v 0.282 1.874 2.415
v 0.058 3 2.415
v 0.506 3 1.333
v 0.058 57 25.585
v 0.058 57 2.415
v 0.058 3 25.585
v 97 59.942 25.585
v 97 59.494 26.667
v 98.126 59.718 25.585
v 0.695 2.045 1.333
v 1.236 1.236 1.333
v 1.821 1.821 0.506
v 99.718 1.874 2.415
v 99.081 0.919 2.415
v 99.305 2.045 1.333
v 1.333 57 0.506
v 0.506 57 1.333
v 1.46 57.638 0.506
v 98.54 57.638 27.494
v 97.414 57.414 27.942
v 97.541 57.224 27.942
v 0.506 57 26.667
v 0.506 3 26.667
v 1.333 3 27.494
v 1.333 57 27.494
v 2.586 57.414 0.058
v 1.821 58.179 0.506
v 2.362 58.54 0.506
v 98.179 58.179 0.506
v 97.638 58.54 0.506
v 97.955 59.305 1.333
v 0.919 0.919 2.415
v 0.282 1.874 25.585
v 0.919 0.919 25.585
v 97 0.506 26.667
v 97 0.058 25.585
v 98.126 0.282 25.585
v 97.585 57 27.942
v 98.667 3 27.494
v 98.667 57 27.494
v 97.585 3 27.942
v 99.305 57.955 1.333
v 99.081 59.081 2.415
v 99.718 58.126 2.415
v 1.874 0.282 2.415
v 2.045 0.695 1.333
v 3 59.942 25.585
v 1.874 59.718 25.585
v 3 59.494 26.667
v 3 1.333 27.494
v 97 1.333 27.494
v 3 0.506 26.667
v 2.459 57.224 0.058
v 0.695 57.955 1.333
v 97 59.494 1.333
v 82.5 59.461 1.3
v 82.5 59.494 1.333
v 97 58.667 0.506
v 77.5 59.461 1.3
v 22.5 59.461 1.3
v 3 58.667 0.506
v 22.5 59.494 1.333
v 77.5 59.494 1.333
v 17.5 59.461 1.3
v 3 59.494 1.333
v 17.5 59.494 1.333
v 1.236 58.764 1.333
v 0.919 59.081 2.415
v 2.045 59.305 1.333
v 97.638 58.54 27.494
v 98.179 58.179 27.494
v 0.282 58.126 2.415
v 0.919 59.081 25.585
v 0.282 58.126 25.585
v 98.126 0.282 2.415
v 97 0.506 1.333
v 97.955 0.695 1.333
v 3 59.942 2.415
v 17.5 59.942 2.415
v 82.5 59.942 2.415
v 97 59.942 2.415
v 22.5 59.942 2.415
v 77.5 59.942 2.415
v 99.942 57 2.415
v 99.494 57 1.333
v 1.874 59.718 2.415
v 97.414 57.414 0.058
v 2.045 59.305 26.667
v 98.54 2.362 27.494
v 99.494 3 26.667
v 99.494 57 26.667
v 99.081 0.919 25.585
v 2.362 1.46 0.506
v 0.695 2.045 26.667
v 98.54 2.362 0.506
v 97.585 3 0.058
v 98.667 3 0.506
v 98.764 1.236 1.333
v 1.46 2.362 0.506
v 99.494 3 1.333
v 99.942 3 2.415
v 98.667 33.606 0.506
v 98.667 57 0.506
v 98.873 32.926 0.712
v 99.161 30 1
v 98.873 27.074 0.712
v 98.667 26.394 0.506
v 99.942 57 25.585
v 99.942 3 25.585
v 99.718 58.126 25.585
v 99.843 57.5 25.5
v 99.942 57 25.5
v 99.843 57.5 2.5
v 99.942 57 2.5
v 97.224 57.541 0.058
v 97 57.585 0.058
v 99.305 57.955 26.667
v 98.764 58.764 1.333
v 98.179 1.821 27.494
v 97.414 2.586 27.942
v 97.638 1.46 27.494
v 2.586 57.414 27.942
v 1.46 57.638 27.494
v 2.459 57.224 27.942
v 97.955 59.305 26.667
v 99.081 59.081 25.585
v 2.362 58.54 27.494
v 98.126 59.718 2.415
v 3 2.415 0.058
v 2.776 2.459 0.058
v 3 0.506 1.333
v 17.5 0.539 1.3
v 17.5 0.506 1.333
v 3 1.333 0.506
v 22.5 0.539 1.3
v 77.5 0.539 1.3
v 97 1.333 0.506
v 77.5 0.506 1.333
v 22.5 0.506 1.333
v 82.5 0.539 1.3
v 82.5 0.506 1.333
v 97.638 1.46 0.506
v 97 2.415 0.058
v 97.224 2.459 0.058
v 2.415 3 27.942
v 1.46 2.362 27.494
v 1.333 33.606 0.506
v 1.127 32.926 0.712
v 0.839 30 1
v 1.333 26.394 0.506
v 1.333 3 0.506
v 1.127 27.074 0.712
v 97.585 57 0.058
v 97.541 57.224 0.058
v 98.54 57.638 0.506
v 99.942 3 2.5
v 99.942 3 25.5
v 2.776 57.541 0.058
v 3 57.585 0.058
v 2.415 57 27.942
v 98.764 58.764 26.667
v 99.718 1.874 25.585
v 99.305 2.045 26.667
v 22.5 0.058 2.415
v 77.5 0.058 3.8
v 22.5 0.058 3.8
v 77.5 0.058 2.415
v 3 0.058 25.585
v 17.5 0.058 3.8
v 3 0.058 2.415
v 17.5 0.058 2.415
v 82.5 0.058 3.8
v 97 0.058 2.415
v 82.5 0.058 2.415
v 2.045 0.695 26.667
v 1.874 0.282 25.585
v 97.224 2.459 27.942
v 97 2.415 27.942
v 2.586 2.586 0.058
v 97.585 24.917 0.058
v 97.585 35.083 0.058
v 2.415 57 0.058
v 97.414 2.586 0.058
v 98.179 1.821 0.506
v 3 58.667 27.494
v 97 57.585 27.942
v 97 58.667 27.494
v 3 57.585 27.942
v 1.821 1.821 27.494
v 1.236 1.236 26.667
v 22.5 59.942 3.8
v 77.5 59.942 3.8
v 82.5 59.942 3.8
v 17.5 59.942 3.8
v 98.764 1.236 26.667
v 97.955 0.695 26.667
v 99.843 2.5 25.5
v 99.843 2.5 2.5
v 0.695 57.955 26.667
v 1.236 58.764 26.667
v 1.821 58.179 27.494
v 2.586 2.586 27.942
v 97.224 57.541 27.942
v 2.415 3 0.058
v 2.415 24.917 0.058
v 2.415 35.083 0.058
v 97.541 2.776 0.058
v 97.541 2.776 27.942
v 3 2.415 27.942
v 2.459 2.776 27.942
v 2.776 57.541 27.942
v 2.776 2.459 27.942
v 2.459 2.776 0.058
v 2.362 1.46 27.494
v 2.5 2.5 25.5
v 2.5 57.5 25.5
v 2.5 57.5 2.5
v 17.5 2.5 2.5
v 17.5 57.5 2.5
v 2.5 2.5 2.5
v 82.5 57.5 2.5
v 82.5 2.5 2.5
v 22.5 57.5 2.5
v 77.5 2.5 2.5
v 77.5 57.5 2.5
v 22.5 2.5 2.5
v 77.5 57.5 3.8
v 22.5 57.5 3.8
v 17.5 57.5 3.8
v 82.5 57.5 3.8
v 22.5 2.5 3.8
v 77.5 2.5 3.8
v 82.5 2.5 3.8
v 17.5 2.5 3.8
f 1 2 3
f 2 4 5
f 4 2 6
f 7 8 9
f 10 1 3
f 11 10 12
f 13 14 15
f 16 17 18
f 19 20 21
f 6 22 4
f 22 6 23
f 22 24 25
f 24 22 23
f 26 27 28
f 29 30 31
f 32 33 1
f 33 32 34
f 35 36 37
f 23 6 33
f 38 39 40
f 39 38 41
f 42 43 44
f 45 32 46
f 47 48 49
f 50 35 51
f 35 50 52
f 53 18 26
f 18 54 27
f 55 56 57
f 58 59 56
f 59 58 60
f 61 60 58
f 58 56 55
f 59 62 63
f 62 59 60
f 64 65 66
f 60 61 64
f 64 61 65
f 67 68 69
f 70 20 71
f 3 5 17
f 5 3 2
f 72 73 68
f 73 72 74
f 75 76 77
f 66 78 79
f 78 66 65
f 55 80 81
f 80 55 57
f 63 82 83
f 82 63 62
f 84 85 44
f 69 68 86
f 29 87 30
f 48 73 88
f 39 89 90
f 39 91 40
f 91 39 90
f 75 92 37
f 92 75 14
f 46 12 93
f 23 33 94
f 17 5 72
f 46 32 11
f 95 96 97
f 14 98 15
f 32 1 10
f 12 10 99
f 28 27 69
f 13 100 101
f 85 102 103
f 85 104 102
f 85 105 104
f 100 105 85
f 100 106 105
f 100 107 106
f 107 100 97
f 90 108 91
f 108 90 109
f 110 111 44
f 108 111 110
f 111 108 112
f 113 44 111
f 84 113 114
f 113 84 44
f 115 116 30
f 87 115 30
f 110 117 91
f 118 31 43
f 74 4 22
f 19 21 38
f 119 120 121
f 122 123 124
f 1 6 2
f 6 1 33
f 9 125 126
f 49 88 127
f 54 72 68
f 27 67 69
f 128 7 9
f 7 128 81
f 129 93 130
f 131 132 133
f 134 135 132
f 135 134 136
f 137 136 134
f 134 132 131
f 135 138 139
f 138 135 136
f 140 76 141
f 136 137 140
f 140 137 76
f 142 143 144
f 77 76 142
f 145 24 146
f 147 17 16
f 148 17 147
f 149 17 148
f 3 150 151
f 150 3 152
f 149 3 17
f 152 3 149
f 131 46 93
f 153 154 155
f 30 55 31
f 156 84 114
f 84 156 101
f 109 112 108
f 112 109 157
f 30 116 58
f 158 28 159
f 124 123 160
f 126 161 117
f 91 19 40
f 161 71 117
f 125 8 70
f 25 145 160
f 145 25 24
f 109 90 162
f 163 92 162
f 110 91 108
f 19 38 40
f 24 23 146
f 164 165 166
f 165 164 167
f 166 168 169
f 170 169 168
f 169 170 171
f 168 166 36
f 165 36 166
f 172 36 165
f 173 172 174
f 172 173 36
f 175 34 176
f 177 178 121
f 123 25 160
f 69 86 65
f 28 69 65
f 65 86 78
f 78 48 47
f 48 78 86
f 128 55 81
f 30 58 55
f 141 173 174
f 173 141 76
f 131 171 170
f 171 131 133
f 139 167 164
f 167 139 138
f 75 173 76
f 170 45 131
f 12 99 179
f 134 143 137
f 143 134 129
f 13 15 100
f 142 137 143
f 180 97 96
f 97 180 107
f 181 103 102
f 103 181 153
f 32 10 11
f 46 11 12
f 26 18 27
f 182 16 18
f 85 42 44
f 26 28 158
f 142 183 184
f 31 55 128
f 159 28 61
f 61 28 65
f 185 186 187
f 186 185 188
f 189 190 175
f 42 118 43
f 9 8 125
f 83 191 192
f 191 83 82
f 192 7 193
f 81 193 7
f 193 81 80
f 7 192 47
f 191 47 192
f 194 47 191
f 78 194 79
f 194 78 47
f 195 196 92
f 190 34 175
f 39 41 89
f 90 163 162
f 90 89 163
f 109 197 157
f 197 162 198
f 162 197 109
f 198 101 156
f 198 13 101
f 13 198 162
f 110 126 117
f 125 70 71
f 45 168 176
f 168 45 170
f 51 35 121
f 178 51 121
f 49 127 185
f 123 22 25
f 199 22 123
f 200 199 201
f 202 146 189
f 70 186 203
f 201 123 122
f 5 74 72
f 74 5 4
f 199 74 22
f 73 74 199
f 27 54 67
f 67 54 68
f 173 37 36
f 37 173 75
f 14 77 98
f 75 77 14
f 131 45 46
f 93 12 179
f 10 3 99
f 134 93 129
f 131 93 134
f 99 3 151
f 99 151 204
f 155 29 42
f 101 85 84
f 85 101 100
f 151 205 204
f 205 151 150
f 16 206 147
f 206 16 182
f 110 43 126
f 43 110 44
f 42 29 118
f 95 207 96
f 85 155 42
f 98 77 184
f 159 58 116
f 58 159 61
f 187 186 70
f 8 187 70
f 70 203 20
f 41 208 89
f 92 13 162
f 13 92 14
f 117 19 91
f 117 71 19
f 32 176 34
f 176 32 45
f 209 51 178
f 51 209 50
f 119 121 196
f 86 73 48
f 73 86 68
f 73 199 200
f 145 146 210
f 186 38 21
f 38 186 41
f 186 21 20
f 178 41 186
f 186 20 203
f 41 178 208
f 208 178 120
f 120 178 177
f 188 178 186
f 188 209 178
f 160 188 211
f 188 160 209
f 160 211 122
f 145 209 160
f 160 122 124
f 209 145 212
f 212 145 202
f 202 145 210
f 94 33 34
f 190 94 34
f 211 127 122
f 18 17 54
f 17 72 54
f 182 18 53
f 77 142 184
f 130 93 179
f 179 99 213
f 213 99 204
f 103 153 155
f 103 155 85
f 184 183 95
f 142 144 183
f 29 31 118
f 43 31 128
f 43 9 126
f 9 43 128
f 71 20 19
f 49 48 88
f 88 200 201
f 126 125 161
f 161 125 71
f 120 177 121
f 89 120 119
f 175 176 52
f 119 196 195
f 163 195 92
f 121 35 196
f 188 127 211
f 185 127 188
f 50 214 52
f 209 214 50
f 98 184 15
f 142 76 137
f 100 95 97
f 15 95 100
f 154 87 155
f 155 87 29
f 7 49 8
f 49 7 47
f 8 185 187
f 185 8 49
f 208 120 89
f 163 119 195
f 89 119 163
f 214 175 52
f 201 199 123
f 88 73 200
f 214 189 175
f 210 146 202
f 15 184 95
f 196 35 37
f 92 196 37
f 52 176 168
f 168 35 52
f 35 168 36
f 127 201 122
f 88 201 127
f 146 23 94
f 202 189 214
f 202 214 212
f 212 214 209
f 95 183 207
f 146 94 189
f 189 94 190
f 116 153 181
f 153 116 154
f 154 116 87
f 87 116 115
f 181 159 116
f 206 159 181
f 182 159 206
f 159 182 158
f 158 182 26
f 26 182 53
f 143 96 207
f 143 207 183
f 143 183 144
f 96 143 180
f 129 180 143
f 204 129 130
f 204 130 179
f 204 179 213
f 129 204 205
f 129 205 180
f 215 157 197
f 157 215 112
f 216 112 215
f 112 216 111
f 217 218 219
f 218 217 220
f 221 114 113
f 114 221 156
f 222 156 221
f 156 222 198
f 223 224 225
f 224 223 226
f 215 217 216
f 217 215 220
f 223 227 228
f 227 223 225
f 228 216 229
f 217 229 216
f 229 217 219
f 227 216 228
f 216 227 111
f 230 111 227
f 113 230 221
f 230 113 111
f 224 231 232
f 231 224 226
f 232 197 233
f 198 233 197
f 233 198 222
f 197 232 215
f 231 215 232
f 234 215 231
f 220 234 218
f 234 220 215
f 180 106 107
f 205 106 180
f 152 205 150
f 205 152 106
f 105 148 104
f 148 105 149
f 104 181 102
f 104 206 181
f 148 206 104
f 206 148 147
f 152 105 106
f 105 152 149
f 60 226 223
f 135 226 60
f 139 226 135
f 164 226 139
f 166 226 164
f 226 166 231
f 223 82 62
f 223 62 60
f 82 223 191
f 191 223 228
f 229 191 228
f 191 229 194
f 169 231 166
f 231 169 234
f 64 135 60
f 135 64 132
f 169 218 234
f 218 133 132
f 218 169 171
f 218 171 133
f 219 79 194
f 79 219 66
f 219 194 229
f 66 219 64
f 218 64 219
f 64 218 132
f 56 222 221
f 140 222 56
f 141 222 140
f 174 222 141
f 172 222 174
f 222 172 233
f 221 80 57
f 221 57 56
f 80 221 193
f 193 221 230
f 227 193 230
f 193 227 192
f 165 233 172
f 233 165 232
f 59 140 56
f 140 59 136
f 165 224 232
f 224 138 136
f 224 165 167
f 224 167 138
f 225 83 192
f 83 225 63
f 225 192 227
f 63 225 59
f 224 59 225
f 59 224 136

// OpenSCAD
// file: ../../00_common/parameters.scad
// =============================================================================
// OpenMotorBridge - Global CAD Parameters & Settings
// =============================================================================
// File: hardware/cad/scad/00_common/parameters.scad
// Description: Global dimensional constants, manufacturing clearances and
//              circle resolution ($fn) for all OpenSCAD modules.
// =============================================================================

// --- 1. Circle & Curve Resolution ---
$fn = 60; // Smooth cylinders and holes for high-quality MJF 3D printing

// --- 2. Central Main Box Dimensions (3-Tier Sandwich) ---
MAIN_BOX_OUTER_L      = 110.0; // Outer length in X (mm)
MAIN_BOX_OUTER_W      = 74.0;  // Outer width in Y (mm)
MAIN_BOX_LOWER_H      = 17.0;  // Lower case height in Z (mm)
MAIN_BOX_MID_H        = 15.0;  // Mid tray height in Z (mm)
MAIN_BOX_LID_H        = 4.0;   // Lid plate thickness in Z (mm)
MAIN_BOX_WALL         = 2.5;   // Nominal wall thickness (mm)
MAIN_BOX_CORNER_POST  = 5.0;   // Corner clamping screw post size (mm)

// --- 3. Satellite Pod Dimensions (Universal 1-Pod Housing) ---
POD_OUTER_L           = 100.0; // Outer length in X (mm)
POD_OUTER_W           = 60.0;  // Outer width in Y (mm)
POD_OUTER_H           = 28.0;  // Outer height in Z (mm)
POD_WALL              = 2.5;   // Nominal wall thickness (mm)
POD_BULKHEAD_X        = 22.0;  // Partition bulkhead position in X (mm)
POD_CHAMBER_L         = 78.0;  // Sliding chamber length in X (mm)
POD_CHAMBER_W         = 55.0;  // Sliding chamber width in Y (mm)
POD_CHAMBER_H         = 23.0;  // Sliding chamber height in Z (mm)

// --- 4. Pod Linear Guide Rails (Poka-Yoke Tongue & Groove) ---
POD_GROOVE_W          = 3.0;   // Internal guide groove width in Z (mm)
POD_GROOVE_DEPTH      = 1.5;   // Internal guide groove depth in Y (mm)
POD_GROOVE_LEFT_Z     = 8.2;   // Center height of left groove (mm)
POD_GROOVE_RIGHT_Z    = 14.2;  // Center height of right groove (mm, asym offset)

CARTRIDGE_TONGUE_W    = 2.6;   // Cartridge tongue rail height in Z (mm, 0.2mm clearance)
CARTRIDGE_TONGUE_PROT = 1.4;   // Cartridge tongue protrusion in Y (mm, 0.1mm clearance)
CARTRIDGE_CHAMFER_L   = 4.0;   // 30° lead-in chamfer nose length (mm)

// --- 5. Cartridge Dimensions ---
CARTRIDGE_BASE_L      = 75.0;  // Sled length in X (mm)
CARTRIDGE_BASE_W      = 54.0;  // Sled width in Y (mm)
CARTRIDGE_BASE_H      = 20.5;  // Sled height in Z (mm)
CARTRIDGE_FACE_L      = 4.0;   // Front faceplate thickness in X (mm)
CARTRIDGE_FACE_W      = 58.0;  // Front faceplate width in Y (mm)
CARTRIDGE_FACE_H      = 25.0;  // Front faceplate height in Z (mm)

// --- 6. Thermal Copper Studs (Kühlbolzen) ---
COPPER_STUD_DIA       = 8.0;   // Diameter of thermal copper studs (mm)
COPPER_STUD_R         = COPPER_STUD_DIA / 2.0; // Radius = 4.0 mm

// Main Box Thermal Stud Positions (4x in lower case floor)
MAIN_BOX_CU_POS = [
    [35.0, 25.0], // Position 1 (LM5164 DCDC Buck Regulator)
    [45.0, 25.0], // Position 2 (BQ25798 LiPo Charger)
    [30.0, 48.0], // Position 3 (ESP32-S3 Dual-Core SoC)
    [70.0, 40.0]  // Position 4 (Automotive TVS & LC Filter Zone)
];

// Pod & Cartridge Thermal Stud Positions (2x in floor)
POD_CU_POS = [
    [42.0, 30.0], // Forward thermal zone
    [72.0, 30.0]  // Rearward thermal zone
];

// --- 7. Screw & Clearance Dimensions ---
M2_SCREW_HOLE_R       = 1.1;   // M2 clearance hole (r = 1.1 mm -> Ø 2.2 mm)
M2_5_SCREW_HOLE_R     = 1.4;   // M2.5 clearance hole (r = 1.4 mm -> Ø 2.8 mm)
M3_SCREW_HOLE_R       = 1.65;  // M3 clearance hole (r = 1.65 mm -> Ø 3.3 mm)
M4_SCREW_HOLE_R       = 2.2;   // M4 clearance hole (r = 2.2 mm -> Ø 4.4 mm)
M8_BORE_R             = 4.0;   // M8 cable through-bore (r = 4.0 mm -> Ø 8.0 mm)
M8_STUDS_OUTER_R      = 6.0;   // M8 neck outer radius (Ø 12.0 mm)
// main file
// =============================================================================
// OpenMotorBridge - Satellite Pod: Monocoque Tunnel Base with Tube Saddle
// =============================================================================
// File: hardware/cad/scad/02_pod_base/parts/000_pod_tunnel_base.scad
// =============================================================================

include <../../00_common/parameters.scad>;

module pod_tunnel_base(length=100.0, width=60.0, height=28.0, wall=2.5, r_edge=3.0) {
    difference() {
        // 1. Solid Outer Enclosure Body with Rounded Corners (100 x 60 x 28 mm)
        hull() {
            translate([r_edge, r_edge, r_edge])
                sphere(r=r_edge, $fn=16);
            translate([length - r_edge, r_edge, r_edge])
                sphere(r=r_edge, $fn=16);
            translate([r_edge, width - r_edge, r_edge])
                sphere(r=r_edge, $fn=16);
            translate([length - r_edge, width - r_edge, r_edge])
                sphere(r=r_edge, $fn=16);

            translate([r_edge, r_edge, height - r_edge])
                sphere(r=r_edge, $fn=16);
            translate([length - r_edge, r_edge, height - r_edge])
                sphere(r=r_edge, $fn=16);
            translate([r_edge, width - r_edge, height - r_edge])
                sphere(r=r_edge, $fn=16);
            translate([length - r_edge, width - r_edge, height - r_edge])
                sphere(r=r_edge, $fn=16);
        }

        // 2. Hollow Internal Chamber (Open at front mouth +X)
        translate([wall, wall, wall]) {
            cube(size=[length - wall + 0.1, width - 2*wall, height - 2*wall], center=false);
        }

        // 3. Universal Tube Saddle / V-Groove Prism at Bottom (for Frame Tubes Ø 18 - 35 mm)
        translate([-1.0, width/2.0, -14.0]) {
            rotate([0, 90, 0])
                cylinder(r=15.0, h=length + 2.0, $fn=32);
        }

        // 4. Transverse Cable-Tie / Zip-Tie Slots (5.0 x 2.5 mm @ x = 20 mm & x = 80 mm)
        translate([20.0 - 2.5, -1.0, wall - 1.2])
            cube([5.0, width + 2.0, 2.5], center=false);
        translate([80.0 - 2.5, -1.0, wall - 1.2])
            cube([5.0, width + 2.0, 2.5], center=false);
    }
}

// Standalone preview
pod_tunnel_base();
